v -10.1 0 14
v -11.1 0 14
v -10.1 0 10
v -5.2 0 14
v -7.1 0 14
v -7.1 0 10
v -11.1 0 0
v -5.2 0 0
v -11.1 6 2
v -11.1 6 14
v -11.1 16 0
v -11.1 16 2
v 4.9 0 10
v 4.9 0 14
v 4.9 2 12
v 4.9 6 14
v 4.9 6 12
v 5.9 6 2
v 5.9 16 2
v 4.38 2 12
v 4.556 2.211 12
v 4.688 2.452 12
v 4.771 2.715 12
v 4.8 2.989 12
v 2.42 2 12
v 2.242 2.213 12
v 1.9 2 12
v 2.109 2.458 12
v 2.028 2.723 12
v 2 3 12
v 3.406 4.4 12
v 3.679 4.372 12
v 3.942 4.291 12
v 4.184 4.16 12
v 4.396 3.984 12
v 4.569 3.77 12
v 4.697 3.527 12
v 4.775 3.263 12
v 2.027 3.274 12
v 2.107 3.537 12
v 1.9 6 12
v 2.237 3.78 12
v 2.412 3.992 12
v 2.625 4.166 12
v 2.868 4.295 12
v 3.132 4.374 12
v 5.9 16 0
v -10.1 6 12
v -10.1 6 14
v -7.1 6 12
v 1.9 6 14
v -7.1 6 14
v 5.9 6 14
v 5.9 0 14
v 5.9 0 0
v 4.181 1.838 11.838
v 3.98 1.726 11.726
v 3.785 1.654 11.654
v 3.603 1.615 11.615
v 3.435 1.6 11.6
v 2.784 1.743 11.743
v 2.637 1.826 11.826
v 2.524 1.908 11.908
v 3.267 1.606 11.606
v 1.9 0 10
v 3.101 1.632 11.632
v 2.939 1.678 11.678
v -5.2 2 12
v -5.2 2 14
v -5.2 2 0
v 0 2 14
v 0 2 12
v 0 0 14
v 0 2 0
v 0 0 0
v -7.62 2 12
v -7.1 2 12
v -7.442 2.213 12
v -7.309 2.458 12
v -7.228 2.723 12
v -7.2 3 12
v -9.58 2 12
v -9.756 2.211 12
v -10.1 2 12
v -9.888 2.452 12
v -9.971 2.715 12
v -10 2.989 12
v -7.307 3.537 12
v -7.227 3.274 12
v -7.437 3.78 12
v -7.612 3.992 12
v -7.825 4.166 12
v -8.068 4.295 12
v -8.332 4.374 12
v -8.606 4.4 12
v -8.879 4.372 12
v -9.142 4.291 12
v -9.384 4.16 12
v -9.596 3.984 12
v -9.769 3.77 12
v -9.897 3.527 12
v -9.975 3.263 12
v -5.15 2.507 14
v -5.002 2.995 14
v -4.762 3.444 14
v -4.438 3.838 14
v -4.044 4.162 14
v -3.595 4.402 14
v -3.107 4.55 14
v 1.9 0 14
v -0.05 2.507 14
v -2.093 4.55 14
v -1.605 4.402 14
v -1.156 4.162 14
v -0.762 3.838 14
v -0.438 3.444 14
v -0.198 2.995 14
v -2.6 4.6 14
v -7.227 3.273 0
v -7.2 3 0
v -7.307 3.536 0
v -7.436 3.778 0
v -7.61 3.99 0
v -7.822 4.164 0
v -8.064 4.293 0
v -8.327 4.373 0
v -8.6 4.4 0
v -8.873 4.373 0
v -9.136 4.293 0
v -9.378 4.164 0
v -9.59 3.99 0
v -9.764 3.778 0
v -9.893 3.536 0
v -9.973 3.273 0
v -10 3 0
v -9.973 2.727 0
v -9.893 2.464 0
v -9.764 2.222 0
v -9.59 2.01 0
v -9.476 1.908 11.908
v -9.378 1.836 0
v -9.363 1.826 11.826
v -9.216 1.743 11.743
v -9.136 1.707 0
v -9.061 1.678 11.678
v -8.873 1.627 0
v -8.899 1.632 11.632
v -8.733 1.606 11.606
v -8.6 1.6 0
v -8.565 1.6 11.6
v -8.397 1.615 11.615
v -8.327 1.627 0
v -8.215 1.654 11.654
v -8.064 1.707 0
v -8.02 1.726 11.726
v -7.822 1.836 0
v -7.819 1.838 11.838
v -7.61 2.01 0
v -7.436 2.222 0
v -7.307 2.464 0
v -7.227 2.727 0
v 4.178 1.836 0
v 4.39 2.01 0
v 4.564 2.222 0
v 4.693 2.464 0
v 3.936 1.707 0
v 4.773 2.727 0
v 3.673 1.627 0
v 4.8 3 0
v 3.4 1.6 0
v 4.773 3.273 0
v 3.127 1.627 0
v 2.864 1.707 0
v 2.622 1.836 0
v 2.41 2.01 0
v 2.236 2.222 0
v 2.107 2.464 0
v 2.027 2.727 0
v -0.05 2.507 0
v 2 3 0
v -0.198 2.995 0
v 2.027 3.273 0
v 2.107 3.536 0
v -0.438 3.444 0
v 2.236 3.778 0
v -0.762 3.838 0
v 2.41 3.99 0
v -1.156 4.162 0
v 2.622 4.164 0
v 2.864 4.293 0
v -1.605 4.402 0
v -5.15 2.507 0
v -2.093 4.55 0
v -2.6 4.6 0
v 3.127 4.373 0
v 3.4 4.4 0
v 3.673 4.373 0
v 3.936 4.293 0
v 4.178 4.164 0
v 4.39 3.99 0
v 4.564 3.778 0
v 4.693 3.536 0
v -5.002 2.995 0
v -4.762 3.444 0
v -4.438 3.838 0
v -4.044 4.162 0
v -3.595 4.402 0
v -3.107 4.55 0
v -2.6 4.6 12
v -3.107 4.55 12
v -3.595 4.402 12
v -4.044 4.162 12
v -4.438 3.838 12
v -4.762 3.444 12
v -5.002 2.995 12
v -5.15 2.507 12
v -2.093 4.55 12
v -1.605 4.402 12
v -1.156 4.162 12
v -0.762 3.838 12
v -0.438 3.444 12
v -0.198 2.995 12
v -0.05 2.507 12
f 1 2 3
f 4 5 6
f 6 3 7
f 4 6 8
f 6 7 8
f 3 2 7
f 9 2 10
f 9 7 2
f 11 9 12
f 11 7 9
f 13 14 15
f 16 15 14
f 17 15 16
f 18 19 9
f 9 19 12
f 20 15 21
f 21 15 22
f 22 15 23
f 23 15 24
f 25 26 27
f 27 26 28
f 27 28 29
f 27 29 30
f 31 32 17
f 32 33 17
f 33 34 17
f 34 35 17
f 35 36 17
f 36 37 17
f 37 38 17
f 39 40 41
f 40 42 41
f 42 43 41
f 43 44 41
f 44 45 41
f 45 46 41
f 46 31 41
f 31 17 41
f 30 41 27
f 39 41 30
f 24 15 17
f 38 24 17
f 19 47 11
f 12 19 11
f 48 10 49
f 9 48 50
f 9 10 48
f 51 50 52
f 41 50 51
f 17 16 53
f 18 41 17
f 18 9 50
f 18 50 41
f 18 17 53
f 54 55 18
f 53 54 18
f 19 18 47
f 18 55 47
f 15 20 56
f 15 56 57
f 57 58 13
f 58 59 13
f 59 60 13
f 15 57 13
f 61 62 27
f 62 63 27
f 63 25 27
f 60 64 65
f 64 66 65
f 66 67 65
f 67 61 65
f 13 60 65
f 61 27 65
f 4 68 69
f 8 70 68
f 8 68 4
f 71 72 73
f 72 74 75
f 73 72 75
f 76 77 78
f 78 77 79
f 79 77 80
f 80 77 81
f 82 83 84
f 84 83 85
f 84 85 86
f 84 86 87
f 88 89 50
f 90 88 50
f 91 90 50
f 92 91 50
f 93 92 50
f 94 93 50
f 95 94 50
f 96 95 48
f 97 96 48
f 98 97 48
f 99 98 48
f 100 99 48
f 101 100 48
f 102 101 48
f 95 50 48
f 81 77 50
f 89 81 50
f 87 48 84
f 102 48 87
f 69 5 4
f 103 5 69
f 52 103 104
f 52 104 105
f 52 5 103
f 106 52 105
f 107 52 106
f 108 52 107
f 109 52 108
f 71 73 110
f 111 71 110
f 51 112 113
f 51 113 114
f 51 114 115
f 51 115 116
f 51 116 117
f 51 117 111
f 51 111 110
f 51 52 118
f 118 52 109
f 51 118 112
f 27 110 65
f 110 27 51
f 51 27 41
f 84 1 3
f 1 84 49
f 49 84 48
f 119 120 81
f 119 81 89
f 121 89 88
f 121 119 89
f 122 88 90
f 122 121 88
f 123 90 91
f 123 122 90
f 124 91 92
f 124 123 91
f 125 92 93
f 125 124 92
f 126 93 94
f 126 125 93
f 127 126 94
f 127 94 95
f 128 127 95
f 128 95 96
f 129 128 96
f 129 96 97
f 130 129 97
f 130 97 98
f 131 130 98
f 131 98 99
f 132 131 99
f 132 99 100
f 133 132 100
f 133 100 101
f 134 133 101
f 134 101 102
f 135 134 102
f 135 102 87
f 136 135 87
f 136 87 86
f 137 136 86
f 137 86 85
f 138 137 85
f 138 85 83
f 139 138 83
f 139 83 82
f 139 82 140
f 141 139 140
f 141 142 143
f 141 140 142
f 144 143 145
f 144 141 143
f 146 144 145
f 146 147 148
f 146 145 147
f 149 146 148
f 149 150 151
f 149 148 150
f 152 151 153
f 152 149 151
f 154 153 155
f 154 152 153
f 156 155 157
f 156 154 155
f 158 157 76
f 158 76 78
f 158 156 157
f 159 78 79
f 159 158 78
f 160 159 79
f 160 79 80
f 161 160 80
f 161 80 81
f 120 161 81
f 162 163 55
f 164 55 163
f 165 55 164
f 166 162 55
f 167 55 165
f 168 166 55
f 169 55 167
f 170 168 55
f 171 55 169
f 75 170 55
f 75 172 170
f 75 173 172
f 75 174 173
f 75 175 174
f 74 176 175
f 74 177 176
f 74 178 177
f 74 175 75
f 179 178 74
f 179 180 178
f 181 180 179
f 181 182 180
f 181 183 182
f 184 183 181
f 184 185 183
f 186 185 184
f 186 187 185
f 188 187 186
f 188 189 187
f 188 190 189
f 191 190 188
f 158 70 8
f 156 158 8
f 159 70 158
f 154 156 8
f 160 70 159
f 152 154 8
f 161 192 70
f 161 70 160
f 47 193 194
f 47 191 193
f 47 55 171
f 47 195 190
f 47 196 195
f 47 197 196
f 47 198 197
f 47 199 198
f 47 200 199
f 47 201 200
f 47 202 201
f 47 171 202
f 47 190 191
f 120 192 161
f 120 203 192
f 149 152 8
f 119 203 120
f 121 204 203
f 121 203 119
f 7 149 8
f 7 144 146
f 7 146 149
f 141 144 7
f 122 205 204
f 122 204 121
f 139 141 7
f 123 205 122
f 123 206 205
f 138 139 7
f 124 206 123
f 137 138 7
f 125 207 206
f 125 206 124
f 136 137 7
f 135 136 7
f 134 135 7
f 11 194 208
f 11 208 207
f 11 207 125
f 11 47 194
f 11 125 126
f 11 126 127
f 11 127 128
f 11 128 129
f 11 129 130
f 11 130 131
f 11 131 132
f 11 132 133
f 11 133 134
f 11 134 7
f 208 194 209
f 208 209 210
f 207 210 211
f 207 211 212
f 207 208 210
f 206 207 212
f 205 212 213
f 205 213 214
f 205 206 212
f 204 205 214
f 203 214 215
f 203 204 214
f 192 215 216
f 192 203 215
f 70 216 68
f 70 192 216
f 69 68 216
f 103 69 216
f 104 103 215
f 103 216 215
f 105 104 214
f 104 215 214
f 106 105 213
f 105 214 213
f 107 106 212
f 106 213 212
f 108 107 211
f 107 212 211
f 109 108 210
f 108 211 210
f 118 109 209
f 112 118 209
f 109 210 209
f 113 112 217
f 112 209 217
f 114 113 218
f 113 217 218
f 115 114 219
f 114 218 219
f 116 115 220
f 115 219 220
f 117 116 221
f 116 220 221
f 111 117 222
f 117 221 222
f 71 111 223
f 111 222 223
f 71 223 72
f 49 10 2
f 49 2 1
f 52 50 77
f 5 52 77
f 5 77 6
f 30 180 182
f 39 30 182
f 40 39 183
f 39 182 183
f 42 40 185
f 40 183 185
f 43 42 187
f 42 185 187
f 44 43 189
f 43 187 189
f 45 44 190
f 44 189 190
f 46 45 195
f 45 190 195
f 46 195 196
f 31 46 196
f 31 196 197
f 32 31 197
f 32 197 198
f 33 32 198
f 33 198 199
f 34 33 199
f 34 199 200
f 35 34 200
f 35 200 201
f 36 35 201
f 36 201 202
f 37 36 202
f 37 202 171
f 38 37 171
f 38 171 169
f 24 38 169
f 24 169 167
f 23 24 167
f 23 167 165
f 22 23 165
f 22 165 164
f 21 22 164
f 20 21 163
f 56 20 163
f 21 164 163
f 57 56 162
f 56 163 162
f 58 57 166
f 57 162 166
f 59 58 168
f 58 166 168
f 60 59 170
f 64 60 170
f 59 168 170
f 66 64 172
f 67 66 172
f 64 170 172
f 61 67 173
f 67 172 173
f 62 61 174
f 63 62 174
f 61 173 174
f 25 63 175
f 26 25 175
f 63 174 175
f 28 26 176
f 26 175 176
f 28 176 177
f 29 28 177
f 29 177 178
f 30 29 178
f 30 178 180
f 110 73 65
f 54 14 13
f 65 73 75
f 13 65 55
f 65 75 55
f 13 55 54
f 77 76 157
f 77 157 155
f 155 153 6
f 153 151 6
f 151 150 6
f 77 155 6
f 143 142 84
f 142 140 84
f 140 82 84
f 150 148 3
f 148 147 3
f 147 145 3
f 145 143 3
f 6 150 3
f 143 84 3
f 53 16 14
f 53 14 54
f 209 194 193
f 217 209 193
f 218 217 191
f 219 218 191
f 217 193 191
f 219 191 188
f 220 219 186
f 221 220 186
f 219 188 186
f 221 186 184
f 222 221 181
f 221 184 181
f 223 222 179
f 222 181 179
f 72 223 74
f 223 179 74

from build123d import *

# Parameters (mm, degrees)
F1_DEPTH    = 12
F0_W        = 8.5
F0_H        = 10
F2_DEPTH    = 2
F4_D        = 2.8
F6_W        = 1
F6_H        = 6
F7_DEPTH    = 2
F8_T1_DEPTH = 3
F8_T3_DEPTH = 3


# Not quite as in the source:
# - a fillet or chamfer that OpenCascade refuses, or shapes differently, is made with other operations: its cross-section is extruded or revolved along the edge and cut away or added


with BuildPart() as f1:
    # F0 (on Top) → F1 (new body)
    with BuildSketch(Plane.XY):
        with BuildLine():
            Line((0, 2), (0, 0))
            Line((0, 0), (5.9, 0))
            Line((5.9, 0), (5.9, 6))
            Line((5.9, 6), (-2.6, 6))
            Line((-2.6, 6), (-2.6, 4.6))
            ThreePointArc((-2.6, 4.6), (-0.7615223689, 3.8384776311), (0, 2))
        make_face()
    extrude(amount=F1_DEPTH)

    # F0 (on Top) → F2 (join)
    with BuildSketch(Plane.XY):
        with Locations((1.65, 11)):
            Rectangle(F0_W, F0_H)
    extrude(amount=F2_DEPTH)

    # F4 (through all)
    with Locations(Plane.XY.offset(12)):
        with Locations((3.4, 3)):
            Hole(F4_D / 2)

    # F5: F1 across face


with BuildPart() as f1_1:
    add(f1.part)
    add(f1.part.mirror(Plane(origin=(-2.6, 8.397826087, 3.2826086957), x_dir=(0, -1, 0), z_dir=(-1, 0, 0))))

    # F6 (on face) → F7 (join)
    with BuildSketch(Plane.XY.offset(12)):
        with Locations((-10.6, 3)):
            Rectangle(F6_W, F6_H)
        with BuildLine():
            Line((1.9, 6), (-7.1, 6))
            Line((-7.1, 6), (-7.1, 0))
            Line((-7.1, 0), (-5.2, 0))
            Line((-5.2, 0), (-5.2, 2))
            ThreePointArc((-5.2, 2), (-2.6, 4.6), (0, 2))
            Line((0, 2), (0, 0))
            Line((0, 0), (1.9, 0))
            Line((1.9, 0), (1.9, 6))
        make_face()
        with Locations((5.4, 3)):
            Rectangle(F6_W, F6_H)
    extrude(amount=F7_DEPTH)

    # F8: chamfer of 2 on 2 edges, made by hand

    # F8_s2 → F8_t1 (cut)
    with BuildSketch(Plane.YZ.offset(-10.1)):
        Polygon((2, 12), (0, 10), (0, 12), align=None)
    extrude(amount=F8_T1_DEPTH, mode=Mode.SUBTRACT)

    # F8_s4 → F8_t3 (cut)
    with BuildSketch(Plane.YZ.offset(1.9)):
        Polygon((2, 12), (0, 10), (0, 12), align=None)
    extrude(amount=F8_T3_DEPTH, mode=Mode.SUBTRACT)


solid = f1_1.part
